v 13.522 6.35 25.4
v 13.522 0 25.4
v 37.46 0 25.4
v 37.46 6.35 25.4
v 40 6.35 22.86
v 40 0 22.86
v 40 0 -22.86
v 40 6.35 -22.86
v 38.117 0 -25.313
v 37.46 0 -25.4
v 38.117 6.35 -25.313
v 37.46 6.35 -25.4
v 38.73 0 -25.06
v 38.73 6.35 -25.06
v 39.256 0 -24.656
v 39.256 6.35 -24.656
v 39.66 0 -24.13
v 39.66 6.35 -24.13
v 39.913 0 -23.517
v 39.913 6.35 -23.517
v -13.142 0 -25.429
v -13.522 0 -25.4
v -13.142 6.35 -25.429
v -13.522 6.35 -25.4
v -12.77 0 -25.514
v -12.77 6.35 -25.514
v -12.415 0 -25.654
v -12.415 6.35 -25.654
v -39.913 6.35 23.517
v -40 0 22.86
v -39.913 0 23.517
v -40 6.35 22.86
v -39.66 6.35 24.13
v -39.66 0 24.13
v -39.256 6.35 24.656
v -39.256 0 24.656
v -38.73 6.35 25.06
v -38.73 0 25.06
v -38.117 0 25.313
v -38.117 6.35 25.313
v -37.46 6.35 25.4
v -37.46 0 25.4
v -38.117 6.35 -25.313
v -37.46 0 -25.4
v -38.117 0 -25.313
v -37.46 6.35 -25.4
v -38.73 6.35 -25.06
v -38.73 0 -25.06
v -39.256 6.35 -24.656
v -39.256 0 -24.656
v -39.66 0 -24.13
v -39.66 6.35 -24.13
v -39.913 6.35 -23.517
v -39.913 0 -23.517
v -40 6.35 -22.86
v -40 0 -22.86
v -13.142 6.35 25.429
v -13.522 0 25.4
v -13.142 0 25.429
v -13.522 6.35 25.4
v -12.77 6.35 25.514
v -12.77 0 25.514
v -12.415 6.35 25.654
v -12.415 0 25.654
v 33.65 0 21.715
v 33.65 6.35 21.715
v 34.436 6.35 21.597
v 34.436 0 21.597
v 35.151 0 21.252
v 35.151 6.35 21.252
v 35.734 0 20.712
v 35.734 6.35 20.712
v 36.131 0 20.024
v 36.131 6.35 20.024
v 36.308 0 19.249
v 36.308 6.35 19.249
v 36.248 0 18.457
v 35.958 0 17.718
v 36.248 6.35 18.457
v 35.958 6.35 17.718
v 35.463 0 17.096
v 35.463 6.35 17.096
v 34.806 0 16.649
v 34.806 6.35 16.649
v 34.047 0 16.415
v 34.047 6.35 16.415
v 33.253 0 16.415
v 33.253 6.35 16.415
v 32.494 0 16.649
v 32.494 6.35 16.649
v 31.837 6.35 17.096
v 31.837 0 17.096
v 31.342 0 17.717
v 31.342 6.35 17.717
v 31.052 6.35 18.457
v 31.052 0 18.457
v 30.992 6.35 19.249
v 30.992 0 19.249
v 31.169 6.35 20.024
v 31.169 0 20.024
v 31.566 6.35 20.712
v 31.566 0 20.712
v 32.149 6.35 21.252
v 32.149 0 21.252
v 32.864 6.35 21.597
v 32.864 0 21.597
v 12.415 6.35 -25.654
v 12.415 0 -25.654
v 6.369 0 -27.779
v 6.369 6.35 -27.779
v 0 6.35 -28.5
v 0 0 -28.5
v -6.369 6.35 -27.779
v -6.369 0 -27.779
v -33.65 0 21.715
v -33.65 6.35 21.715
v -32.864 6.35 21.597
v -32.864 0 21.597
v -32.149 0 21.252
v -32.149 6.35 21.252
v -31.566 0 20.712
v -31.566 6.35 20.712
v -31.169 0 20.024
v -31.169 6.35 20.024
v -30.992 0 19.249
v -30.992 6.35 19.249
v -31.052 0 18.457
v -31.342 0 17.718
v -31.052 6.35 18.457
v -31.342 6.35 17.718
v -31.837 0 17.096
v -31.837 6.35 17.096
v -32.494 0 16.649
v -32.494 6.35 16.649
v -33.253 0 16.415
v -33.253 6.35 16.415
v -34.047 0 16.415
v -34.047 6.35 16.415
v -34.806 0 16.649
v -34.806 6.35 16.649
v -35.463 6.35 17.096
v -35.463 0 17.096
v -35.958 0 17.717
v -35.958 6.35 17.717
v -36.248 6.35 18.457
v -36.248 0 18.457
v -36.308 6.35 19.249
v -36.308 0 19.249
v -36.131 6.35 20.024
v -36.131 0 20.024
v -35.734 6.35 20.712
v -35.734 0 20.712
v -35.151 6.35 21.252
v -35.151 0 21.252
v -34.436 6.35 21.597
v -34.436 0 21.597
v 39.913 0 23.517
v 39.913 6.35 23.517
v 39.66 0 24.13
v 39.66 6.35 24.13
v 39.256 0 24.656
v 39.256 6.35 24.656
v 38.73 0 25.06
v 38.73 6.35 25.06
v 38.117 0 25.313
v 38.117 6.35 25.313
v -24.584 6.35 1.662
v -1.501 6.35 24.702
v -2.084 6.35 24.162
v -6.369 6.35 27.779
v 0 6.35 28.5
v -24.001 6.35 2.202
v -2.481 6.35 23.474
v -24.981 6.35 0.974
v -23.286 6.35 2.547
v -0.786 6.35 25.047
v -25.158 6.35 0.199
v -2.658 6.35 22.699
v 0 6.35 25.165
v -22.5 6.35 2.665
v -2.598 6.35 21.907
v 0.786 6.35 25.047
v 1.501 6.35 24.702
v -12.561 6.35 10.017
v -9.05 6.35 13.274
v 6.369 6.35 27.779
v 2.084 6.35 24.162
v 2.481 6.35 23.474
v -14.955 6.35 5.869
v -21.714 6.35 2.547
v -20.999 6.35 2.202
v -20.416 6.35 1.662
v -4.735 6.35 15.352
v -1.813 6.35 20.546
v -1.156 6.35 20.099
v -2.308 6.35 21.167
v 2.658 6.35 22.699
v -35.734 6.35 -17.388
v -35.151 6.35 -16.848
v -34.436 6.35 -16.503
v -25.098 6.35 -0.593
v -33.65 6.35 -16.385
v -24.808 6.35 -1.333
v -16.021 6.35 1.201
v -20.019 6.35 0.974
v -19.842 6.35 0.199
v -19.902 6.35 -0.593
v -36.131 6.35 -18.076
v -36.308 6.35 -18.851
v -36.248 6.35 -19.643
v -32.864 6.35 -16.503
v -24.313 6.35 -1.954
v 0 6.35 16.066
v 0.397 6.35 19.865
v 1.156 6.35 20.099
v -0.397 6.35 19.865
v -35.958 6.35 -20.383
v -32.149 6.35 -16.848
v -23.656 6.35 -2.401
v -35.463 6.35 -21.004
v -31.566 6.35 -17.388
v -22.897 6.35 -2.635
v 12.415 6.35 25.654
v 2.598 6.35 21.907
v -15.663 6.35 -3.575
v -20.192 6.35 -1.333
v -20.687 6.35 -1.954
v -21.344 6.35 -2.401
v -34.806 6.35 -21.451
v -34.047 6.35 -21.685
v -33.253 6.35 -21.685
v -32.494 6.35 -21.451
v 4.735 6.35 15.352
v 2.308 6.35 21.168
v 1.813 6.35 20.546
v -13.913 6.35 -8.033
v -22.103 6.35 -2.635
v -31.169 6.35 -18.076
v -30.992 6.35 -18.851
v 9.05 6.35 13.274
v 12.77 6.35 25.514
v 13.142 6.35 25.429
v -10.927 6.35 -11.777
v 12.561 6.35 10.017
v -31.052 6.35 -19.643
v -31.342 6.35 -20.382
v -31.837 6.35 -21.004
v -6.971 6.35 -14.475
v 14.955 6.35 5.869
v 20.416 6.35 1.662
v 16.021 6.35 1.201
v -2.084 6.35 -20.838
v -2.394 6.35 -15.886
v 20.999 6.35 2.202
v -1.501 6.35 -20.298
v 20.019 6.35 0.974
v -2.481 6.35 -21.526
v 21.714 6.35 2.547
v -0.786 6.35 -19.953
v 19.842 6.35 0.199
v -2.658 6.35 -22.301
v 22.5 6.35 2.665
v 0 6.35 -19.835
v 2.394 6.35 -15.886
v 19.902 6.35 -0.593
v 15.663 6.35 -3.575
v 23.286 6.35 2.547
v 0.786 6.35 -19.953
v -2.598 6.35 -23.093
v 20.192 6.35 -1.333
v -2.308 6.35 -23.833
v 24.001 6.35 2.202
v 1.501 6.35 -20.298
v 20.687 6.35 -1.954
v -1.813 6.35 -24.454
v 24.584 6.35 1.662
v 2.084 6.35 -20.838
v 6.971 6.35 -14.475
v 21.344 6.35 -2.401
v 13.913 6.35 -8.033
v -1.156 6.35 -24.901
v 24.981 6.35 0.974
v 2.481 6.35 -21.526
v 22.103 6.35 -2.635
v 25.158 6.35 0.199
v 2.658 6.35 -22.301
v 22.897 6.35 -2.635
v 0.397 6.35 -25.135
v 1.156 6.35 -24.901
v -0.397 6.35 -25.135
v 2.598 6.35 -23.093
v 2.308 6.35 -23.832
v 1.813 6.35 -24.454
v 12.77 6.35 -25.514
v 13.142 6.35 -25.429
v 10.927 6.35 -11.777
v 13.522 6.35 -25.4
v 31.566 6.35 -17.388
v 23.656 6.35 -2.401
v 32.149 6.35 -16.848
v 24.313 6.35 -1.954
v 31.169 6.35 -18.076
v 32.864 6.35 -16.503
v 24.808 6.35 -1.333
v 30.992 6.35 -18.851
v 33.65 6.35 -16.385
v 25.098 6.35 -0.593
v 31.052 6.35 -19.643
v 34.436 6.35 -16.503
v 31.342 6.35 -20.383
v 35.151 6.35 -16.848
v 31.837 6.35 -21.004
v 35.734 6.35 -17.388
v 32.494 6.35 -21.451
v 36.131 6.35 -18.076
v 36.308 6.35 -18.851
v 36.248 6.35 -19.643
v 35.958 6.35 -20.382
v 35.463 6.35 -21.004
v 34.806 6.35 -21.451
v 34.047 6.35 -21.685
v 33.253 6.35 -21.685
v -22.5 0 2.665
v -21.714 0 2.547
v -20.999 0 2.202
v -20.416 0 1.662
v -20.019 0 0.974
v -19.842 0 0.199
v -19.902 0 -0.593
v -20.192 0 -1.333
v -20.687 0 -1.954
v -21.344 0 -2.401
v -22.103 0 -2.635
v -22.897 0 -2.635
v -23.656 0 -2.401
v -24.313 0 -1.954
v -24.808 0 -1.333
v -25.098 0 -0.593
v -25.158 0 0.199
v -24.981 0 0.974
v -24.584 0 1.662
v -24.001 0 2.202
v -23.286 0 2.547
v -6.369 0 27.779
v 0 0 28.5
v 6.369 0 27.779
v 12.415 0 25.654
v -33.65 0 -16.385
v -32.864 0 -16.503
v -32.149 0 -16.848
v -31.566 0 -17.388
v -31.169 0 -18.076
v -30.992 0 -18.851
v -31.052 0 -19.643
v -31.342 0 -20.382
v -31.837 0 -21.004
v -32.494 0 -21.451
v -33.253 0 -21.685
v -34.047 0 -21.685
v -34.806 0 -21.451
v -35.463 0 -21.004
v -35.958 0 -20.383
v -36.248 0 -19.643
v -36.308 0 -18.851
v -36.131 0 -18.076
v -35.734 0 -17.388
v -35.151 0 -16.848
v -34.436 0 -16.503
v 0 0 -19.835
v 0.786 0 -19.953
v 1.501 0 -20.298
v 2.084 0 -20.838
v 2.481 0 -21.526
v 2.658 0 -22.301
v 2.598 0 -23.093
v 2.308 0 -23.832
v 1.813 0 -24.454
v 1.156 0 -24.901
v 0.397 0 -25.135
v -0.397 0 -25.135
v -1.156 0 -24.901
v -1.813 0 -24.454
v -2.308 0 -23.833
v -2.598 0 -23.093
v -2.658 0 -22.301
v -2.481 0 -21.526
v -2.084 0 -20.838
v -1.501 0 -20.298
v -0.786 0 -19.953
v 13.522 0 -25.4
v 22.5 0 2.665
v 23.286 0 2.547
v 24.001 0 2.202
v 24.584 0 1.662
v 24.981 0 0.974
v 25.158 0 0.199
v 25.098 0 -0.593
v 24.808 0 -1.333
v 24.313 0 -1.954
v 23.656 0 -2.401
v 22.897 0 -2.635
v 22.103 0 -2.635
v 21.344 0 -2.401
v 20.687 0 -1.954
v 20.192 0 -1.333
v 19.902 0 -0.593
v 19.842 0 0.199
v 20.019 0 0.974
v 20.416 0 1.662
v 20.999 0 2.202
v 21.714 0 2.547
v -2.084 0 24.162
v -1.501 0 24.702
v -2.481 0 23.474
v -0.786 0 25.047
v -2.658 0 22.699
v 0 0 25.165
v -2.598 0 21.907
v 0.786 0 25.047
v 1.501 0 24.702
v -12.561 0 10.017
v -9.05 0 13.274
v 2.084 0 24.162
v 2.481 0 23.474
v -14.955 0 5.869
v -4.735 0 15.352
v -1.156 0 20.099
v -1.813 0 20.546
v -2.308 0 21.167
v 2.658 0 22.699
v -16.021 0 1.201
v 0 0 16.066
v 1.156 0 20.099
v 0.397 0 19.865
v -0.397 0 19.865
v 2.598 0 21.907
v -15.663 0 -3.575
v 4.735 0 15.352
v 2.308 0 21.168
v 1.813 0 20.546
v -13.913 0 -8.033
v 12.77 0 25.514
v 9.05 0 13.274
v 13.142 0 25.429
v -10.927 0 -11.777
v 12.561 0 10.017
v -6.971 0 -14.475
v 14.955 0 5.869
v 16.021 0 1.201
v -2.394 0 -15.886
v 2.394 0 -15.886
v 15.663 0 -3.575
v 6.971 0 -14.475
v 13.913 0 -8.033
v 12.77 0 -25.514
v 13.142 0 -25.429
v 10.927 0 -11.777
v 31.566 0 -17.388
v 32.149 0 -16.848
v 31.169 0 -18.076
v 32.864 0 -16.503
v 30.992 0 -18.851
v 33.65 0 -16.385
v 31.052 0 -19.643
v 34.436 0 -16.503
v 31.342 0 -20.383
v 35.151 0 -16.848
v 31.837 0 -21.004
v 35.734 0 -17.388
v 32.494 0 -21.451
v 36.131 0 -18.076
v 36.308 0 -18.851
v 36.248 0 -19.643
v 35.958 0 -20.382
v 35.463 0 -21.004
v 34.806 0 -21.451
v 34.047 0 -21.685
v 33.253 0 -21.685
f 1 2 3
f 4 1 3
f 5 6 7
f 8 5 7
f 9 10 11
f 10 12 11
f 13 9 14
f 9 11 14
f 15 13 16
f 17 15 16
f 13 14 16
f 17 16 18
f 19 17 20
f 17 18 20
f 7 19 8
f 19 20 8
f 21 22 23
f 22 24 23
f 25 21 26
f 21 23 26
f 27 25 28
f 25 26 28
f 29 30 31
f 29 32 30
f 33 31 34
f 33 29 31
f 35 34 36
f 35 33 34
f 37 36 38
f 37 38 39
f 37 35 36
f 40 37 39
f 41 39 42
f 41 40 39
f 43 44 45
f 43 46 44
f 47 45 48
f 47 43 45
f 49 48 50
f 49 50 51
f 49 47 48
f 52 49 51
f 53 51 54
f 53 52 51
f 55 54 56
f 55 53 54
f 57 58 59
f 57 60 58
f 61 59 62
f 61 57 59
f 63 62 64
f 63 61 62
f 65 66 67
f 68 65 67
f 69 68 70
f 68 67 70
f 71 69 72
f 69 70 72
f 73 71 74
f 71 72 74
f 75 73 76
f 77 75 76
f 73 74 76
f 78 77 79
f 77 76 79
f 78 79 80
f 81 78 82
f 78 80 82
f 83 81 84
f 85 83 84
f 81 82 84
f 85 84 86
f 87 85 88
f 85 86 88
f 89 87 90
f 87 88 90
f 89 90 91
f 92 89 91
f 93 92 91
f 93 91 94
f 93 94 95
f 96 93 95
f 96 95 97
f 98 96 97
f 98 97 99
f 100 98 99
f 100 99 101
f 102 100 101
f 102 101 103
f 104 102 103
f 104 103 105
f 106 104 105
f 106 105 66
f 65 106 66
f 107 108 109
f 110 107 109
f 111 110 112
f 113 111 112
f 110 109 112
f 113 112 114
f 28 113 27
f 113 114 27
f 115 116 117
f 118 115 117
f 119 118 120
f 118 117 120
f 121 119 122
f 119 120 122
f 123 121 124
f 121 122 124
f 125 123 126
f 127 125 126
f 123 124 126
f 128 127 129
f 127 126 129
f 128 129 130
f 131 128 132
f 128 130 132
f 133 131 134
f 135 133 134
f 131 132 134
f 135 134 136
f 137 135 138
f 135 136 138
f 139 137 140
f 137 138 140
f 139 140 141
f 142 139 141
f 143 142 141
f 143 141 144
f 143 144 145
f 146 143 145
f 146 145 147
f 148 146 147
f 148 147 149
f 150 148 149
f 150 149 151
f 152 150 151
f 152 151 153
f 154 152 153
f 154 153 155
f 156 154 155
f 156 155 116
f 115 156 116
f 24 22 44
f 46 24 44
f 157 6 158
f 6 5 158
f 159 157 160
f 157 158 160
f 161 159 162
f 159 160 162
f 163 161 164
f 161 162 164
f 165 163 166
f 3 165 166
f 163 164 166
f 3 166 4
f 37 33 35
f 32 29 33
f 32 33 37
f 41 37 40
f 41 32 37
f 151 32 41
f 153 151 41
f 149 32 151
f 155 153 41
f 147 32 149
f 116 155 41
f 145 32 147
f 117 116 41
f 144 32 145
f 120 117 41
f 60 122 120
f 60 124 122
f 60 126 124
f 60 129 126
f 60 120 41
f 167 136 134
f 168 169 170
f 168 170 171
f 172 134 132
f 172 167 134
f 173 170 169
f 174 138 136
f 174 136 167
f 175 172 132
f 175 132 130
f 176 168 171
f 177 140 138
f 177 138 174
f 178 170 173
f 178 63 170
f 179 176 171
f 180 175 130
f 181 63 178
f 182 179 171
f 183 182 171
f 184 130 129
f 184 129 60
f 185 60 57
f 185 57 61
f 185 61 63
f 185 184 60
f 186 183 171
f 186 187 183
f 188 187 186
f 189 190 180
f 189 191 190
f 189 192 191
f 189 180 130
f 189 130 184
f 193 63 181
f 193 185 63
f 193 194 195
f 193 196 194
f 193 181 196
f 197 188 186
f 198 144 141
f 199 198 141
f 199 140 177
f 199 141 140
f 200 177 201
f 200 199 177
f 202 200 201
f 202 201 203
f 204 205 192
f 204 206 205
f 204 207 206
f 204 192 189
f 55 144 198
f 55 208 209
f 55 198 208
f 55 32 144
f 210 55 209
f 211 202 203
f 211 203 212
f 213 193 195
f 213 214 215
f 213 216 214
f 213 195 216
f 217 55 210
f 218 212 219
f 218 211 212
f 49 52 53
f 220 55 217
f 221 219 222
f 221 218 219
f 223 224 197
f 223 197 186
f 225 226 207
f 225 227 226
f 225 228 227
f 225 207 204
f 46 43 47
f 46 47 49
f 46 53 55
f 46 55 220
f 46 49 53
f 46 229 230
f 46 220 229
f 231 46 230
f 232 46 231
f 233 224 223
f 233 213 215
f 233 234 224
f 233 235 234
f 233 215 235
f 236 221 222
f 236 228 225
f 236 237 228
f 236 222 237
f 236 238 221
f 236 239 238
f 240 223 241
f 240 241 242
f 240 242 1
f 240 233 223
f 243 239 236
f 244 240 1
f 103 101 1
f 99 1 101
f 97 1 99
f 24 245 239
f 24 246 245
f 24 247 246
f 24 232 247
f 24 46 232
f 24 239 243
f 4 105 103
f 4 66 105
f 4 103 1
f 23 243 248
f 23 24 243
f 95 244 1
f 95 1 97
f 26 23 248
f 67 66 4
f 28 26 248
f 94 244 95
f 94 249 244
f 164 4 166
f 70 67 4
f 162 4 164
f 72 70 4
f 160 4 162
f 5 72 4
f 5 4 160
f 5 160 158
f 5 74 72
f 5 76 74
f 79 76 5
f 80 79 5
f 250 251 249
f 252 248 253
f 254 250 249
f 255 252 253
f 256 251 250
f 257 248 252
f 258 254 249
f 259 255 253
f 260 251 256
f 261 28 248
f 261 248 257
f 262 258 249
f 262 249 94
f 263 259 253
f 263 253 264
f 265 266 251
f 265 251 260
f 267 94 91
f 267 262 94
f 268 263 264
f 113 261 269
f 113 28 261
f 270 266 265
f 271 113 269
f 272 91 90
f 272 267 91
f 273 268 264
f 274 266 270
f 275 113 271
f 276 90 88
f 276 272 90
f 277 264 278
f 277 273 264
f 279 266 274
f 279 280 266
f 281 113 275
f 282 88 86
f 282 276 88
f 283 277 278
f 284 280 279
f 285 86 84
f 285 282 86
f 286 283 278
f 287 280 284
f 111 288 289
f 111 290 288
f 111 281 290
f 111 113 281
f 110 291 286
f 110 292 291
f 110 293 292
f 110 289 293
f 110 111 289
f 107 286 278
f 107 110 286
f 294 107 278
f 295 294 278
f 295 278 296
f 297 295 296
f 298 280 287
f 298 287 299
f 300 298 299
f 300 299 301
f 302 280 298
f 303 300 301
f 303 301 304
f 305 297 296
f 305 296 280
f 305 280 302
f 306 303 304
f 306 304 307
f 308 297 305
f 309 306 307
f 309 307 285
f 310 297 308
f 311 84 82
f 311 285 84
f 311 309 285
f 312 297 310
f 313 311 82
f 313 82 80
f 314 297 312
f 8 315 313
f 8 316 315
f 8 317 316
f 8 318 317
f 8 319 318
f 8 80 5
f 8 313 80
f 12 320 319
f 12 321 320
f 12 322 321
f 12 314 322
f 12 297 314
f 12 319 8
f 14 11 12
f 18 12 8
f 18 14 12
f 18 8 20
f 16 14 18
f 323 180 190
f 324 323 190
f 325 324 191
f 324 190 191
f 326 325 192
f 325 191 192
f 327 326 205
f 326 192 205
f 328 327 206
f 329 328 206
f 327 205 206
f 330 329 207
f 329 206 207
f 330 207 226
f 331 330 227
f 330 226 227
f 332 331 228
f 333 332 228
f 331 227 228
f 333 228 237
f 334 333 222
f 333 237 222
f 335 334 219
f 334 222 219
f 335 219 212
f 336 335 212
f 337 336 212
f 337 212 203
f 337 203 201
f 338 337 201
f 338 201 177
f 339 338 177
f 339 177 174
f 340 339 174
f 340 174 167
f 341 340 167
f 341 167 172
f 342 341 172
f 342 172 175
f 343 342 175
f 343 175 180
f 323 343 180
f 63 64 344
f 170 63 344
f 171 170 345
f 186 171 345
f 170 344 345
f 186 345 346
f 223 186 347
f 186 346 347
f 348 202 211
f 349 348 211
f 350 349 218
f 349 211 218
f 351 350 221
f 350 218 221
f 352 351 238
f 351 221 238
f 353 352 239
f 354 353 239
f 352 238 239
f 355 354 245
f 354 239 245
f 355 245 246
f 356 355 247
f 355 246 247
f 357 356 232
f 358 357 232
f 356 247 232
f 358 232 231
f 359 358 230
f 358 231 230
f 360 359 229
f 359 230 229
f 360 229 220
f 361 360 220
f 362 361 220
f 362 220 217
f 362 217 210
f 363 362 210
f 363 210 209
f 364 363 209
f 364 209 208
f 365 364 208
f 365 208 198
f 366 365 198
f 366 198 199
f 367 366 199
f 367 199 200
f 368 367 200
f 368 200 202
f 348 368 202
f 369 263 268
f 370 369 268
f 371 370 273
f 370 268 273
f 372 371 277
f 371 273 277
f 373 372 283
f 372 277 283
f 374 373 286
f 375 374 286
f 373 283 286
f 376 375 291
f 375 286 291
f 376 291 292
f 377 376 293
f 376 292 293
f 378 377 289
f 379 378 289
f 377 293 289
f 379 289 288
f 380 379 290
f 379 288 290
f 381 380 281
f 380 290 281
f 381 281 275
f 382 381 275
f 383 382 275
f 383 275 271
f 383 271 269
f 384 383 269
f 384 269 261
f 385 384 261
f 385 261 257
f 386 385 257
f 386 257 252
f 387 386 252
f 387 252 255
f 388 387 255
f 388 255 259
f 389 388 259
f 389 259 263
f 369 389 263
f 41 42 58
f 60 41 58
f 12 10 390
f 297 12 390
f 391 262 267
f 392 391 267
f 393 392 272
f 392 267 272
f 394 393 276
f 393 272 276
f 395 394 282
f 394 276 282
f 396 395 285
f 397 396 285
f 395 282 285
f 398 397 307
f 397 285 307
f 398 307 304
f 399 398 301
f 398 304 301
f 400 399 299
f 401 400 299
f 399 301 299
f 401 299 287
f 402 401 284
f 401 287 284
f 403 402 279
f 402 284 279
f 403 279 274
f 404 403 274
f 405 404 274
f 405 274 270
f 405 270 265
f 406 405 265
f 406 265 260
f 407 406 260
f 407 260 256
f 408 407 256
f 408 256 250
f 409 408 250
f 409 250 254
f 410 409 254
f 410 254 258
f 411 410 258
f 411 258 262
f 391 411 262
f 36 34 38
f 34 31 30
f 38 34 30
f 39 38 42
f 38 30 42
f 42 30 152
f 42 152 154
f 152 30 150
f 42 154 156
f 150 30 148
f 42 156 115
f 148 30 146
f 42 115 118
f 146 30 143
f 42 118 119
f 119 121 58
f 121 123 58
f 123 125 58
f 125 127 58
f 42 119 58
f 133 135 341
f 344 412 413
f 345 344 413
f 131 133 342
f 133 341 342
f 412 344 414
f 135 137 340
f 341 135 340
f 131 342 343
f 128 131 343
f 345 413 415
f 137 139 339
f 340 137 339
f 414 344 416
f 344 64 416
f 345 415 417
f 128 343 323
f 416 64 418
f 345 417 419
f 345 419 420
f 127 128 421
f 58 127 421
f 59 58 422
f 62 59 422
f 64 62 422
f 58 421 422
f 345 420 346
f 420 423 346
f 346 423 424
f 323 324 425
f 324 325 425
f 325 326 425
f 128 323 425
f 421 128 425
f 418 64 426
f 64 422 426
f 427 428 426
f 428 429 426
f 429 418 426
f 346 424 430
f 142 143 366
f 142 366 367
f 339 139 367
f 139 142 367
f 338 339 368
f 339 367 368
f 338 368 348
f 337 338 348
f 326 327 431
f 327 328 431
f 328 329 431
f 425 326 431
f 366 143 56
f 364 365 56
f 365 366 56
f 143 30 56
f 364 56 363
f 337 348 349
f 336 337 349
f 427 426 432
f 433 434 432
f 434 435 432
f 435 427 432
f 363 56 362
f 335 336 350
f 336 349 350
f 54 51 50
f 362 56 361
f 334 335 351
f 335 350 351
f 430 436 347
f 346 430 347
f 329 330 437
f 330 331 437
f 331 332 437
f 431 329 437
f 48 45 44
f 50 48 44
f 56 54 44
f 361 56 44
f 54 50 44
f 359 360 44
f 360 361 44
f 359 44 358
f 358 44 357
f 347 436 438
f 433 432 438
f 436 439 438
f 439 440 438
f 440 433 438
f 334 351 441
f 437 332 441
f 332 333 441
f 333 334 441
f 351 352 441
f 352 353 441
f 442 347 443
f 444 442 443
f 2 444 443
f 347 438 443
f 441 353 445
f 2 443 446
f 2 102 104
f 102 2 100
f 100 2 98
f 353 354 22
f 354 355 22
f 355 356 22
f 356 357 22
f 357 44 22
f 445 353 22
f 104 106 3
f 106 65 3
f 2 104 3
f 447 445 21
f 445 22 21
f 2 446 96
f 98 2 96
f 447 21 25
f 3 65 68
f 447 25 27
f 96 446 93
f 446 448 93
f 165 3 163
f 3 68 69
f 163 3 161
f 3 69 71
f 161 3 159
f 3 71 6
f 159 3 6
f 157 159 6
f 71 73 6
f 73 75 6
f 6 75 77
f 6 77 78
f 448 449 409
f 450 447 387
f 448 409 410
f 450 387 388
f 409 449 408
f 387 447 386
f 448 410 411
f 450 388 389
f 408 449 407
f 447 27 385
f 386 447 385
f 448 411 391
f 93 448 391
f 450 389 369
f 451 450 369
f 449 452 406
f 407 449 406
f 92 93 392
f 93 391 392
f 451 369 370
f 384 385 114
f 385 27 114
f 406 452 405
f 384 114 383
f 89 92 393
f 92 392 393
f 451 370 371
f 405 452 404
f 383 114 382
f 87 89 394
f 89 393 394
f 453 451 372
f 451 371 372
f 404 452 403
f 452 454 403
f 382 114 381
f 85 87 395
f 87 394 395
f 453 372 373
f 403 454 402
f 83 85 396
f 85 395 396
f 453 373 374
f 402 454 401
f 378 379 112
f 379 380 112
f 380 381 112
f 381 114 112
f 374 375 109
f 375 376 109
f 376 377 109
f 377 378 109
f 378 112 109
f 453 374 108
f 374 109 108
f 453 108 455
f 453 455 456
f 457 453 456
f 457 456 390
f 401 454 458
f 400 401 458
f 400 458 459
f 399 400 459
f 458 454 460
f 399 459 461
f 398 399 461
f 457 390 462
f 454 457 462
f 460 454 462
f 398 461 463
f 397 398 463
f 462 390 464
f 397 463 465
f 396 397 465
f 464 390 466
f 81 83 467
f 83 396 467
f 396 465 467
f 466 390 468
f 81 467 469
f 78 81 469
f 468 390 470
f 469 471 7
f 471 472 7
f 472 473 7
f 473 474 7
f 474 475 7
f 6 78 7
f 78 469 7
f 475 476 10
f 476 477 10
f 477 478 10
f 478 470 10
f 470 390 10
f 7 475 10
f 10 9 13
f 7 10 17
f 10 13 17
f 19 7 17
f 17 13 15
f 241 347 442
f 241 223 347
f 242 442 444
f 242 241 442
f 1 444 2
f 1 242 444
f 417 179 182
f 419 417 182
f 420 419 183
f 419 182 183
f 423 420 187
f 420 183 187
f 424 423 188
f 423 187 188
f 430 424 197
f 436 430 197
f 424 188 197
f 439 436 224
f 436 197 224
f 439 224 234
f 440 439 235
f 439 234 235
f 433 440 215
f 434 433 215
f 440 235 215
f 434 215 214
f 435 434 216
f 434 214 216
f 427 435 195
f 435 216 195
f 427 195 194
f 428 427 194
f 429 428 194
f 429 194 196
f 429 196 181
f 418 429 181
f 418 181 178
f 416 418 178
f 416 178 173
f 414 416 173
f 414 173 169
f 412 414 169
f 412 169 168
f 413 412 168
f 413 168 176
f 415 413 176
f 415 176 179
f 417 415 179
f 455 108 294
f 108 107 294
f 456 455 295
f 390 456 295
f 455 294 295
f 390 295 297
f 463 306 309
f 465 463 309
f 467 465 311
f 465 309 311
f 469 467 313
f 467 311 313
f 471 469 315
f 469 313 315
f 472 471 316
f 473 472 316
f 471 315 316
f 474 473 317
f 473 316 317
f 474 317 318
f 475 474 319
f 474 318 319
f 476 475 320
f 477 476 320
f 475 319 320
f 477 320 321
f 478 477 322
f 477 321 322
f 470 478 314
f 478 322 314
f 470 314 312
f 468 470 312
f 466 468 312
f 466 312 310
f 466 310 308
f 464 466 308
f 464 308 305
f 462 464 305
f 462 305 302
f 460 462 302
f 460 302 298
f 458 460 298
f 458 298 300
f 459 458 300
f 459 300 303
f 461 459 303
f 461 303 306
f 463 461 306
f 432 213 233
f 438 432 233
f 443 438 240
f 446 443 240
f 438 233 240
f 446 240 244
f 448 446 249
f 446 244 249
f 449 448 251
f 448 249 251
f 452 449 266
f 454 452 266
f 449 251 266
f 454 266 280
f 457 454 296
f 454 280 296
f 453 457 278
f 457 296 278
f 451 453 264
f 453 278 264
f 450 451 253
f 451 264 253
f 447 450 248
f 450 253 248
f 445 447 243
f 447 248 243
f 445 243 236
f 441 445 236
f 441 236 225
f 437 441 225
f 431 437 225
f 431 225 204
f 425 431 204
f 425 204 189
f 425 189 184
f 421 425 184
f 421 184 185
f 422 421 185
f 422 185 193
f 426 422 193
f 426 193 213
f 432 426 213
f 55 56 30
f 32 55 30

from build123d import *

# Parameters (mm, degrees)
BOSS_EXTRUDE1_DEPTH = 6.35
CUT_EXTRUDE1_REACH  = 51.523
SKETCH2_R           = 16.0655
CUT_EXTRUDE2_REACH  = 51.523
SKETCH3_R           = 2.665
CUT_EXTRUDE3_REACH  = 51.523
SKETCH4_R           = 2.665
FILLET1_R           = 2.54


with BuildPart() as part:
    # Sketch1 → Boss-Extrude1 (new body)
    with BuildSketch(Plane(origin=(0, 0, 0), x_dir=(1, 0, 0), z_dir=(0, 1, 0))):
        with BuildLine():
            Line((-12.926329719, 25.4), (-40, 25.4))
            Line((-40, 25.4), (-40, -25.4))
            Line((-40, -25.4), (-12.926329719, -25.4))
            ThreePointArc((-12.926329719, -25.4), (0, -28.5), (12.926329719, -25.4))
            Line((12.926329719, -25.4), (40, -25.4))
            Line((40, -25.4), (40, 25.4))
            Line((40, 25.4), (12.926329719, 25.4))
            ThreePointArc((12.926329719, 25.4), (0, 28.5), (-12.926329719, 25.4))
        make_face()
    extrude(amount=BOSS_EXTRUDE1_DEPTH)

    # Sketch2 → Cut-Extrude1 (cut, up to next)
    with BuildSketch(Plane(origin=(0, 6.35, 0), x_dir=(1, 0, 0), z_dir=(0, 1, 0)), mode=Mode.PRIVATE) as cut_extrude1_sk1:
        with Locations(Location((0, 0, 0), (0, 0, 270))):
            Circle(SKETCH2_R)
    cut_extrude1_tool1 = extrude(cut_extrude1_sk1.sketch, amount=-CUT_EXTRUDE1_REACH, mode=Mode.PRIVATE) & part.part
    add(cut_extrude1_tool1.solids().sort_by_distance((0, 6.35, 0))[0], mode=Mode.SUBTRACT)

    # Sketch3 → Cut-Extrude2 (cut, up to next)
    with BuildSketch(Plane(origin=(0, 6.35, 0), x_dir=(1, 0, 0), z_dir=(0, 1, 0)), mode=Mode.PRIVATE) as cut_extrude2_sk1:
        with Locations(Location((0, 22.5, 0), (0, 0, 270))):
            Circle(SKETCH3_R)
    cut_extrude2_tool1 = extrude(cut_extrude2_sk1.sketch, amount=-CUT_EXTRUDE2_REACH, mode=Mode.PRIVATE) & part.part
    # Sketch3 → Cut-Extrude2 (cut, up to next)
    with BuildSketch(Plane(origin=(0, 6.35, 0), x_dir=(1, 0, 0), z_dir=(0, 1, 0)), mode=Mode.PRIVATE) as cut_extrude2_sk2:
        with Locations(Location((22.5, 0, 0), (0, 0, 270))):
            Circle(SKETCH3_R)
    cut_extrude2_tool2 = extrude(cut_extrude2_sk2.sketch, amount=-CUT_EXTRUDE2_REACH, mode=Mode.PRIVATE) & part.part
    # Sketch3 → Cut-Extrude2 (cut, up to next)
    with BuildSketch(Plane(origin=(0, 6.35, 0), x_dir=(1, 0, 0), z_dir=(0, 1, 0)), mode=Mode.PRIVATE) as cut_extrude2_sk3:
        with Locations(Location((0, -22.5, 0), (0, 0, 270))):
            Circle(SKETCH3_R)
    cut_extrude2_tool3 = extrude(cut_extrude2_sk3.sketch, amount=-CUT_EXTRUDE2_REACH, mode=Mode.PRIVATE) & part.part
    # Sketch3 → Cut-Extrude2 (cut, up to next)
    with BuildSketch(Plane(origin=(0, 6.35, 0), x_dir=(1, 0, 0), z_dir=(0, 1, 0)), mode=Mode.PRIVATE) as cut_extrude2_sk4:
        with Locations(Location((-22.5, 0, 0), (0, 0, 270))):
            Circle(SKETCH3_R)
    cut_extrude2_tool4 = extrude(cut_extrude2_sk4.sketch, amount=-CUT_EXTRUDE2_REACH, mode=Mode.PRIVATE) & part.part
    add(cut_extrude2_tool1.solids().sort_by_distance((0, 6.35, -22.5))[0], mode=Mode.SUBTRACT)
    add(cut_extrude2_tool2.solids().sort_by_distance((22.5, 6.35, 0))[0], mode=Mode.SUBTRACT)
    add(cut_extrude2_tool3.solids().sort_by_distance((0, 6.35, 22.5))[0], mode=Mode.SUBTRACT)
    add(cut_extrude2_tool4.solids().sort_by_distance((-22.5, 6.35, 0))[0], mode=Mode.SUBTRACT)

    # Sketch4 → Cut-Extrude3 (cut, up to next)
    with BuildSketch(Plane(origin=(0, 6.35, 0), x_dir=(1, 0, 0), z_dir=(0, 1, 0)), mode=Mode.PRIVATE) as cut_extrude3_sk1:
        with Locations(Location((-33.65, 19.05, 0), (0, 0, 270))):
            Circle(SKETCH4_R)
    cut_extrude3_tool1 = extrude(cut_extrude3_sk1.sketch, amount=-CUT_EXTRUDE3_REACH, mode=Mode.PRIVATE) & part.part
    # Sketch4 → Cut-Extrude3 (cut, up to next)
    with BuildSketch(Plane(origin=(0, 6.35, 0), x_dir=(1, 0, 0), z_dir=(0, 1, 0)), mode=Mode.PRIVATE) as cut_extrude3_sk2:
        with Locations(Location((-33.65, -19.05, 0), (0, 0, 270))):
            Circle(SKETCH4_R)
    cut_extrude3_tool2 = extrude(cut_extrude3_sk2.sketch, amount=-CUT_EXTRUDE3_REACH, mode=Mode.PRIVATE) & part.part
    # Sketch4 → Cut-Extrude3 (cut, up to next)
    with BuildSketch(Plane(origin=(0, 6.35, 0), x_dir=(1, 0, 0), z_dir=(0, 1, 0)), mode=Mode.PRIVATE) as cut_extrude3_sk3:
        with Locations(Location((33.65, 19.05, 0), (0, 0, 270))):
            Circle(SKETCH4_R)
    cut_extrude3_tool3 = extrude(cut_extrude3_sk3.sketch, amount=-CUT_EXTRUDE3_REACH, mode=Mode.PRIVATE) & part.part
    # Sketch4 → Cut-Extrude3 (cut, up to next)
    with BuildSketch(Plane(origin=(0, 6.35, 0), x_dir=(1, 0, 0), z_dir=(0, 1, 0)), mode=Mode.PRIVATE) as cut_extrude3_sk4:
        with Locations(Location((33.65, -19.05, 0), (0, 0, 270))):
            Circle(SKETCH4_R)
    cut_extrude3_tool4 = extrude(cut_extrude3_sk4.sketch, amount=-CUT_EXTRUDE3_REACH, mode=Mode.PRIVATE) & part.part
    add(cut_extrude3_tool1.solids().sort_by_distance((-33.65, 6.35, -19.05))[0], mode=Mode.SUBTRACT)
    add(cut_extrude3_tool2.solids().sort_by_distance((-33.65, 6.35, 19.05))[0], mode=Mode.SUBTRACT)
    add(cut_extrude3_tool3.solids().sort_by_distance((33.65, 6.35, -19.05))[0], mode=Mode.SUBTRACT)
    add(cut_extrude3_tool4.solids().sort_by_distance((33.65, 6.35, 19.05))[0], mode=Mode.SUBTRACT)

    # Fillet1
    fillet1_edges = [part.edges().sort_by_distance(p)[0] for p in [
        (12.926329719, 3.175, -25.4),
        (40, 3.175, -25.4),
        (40, 3.175, 25.4),
        (12.926329719, 3.175, 25.4),
        (-12.926329719, 3.175, 25.4),
        (-40, 3.175, 25.4),
        (-40, 3.175, -25.4),
        (-12.926329719, 3.175, -25.4),
    ]]
    fillet(fillet1_edges, radius=FILLET1_R)


solid = part.part
